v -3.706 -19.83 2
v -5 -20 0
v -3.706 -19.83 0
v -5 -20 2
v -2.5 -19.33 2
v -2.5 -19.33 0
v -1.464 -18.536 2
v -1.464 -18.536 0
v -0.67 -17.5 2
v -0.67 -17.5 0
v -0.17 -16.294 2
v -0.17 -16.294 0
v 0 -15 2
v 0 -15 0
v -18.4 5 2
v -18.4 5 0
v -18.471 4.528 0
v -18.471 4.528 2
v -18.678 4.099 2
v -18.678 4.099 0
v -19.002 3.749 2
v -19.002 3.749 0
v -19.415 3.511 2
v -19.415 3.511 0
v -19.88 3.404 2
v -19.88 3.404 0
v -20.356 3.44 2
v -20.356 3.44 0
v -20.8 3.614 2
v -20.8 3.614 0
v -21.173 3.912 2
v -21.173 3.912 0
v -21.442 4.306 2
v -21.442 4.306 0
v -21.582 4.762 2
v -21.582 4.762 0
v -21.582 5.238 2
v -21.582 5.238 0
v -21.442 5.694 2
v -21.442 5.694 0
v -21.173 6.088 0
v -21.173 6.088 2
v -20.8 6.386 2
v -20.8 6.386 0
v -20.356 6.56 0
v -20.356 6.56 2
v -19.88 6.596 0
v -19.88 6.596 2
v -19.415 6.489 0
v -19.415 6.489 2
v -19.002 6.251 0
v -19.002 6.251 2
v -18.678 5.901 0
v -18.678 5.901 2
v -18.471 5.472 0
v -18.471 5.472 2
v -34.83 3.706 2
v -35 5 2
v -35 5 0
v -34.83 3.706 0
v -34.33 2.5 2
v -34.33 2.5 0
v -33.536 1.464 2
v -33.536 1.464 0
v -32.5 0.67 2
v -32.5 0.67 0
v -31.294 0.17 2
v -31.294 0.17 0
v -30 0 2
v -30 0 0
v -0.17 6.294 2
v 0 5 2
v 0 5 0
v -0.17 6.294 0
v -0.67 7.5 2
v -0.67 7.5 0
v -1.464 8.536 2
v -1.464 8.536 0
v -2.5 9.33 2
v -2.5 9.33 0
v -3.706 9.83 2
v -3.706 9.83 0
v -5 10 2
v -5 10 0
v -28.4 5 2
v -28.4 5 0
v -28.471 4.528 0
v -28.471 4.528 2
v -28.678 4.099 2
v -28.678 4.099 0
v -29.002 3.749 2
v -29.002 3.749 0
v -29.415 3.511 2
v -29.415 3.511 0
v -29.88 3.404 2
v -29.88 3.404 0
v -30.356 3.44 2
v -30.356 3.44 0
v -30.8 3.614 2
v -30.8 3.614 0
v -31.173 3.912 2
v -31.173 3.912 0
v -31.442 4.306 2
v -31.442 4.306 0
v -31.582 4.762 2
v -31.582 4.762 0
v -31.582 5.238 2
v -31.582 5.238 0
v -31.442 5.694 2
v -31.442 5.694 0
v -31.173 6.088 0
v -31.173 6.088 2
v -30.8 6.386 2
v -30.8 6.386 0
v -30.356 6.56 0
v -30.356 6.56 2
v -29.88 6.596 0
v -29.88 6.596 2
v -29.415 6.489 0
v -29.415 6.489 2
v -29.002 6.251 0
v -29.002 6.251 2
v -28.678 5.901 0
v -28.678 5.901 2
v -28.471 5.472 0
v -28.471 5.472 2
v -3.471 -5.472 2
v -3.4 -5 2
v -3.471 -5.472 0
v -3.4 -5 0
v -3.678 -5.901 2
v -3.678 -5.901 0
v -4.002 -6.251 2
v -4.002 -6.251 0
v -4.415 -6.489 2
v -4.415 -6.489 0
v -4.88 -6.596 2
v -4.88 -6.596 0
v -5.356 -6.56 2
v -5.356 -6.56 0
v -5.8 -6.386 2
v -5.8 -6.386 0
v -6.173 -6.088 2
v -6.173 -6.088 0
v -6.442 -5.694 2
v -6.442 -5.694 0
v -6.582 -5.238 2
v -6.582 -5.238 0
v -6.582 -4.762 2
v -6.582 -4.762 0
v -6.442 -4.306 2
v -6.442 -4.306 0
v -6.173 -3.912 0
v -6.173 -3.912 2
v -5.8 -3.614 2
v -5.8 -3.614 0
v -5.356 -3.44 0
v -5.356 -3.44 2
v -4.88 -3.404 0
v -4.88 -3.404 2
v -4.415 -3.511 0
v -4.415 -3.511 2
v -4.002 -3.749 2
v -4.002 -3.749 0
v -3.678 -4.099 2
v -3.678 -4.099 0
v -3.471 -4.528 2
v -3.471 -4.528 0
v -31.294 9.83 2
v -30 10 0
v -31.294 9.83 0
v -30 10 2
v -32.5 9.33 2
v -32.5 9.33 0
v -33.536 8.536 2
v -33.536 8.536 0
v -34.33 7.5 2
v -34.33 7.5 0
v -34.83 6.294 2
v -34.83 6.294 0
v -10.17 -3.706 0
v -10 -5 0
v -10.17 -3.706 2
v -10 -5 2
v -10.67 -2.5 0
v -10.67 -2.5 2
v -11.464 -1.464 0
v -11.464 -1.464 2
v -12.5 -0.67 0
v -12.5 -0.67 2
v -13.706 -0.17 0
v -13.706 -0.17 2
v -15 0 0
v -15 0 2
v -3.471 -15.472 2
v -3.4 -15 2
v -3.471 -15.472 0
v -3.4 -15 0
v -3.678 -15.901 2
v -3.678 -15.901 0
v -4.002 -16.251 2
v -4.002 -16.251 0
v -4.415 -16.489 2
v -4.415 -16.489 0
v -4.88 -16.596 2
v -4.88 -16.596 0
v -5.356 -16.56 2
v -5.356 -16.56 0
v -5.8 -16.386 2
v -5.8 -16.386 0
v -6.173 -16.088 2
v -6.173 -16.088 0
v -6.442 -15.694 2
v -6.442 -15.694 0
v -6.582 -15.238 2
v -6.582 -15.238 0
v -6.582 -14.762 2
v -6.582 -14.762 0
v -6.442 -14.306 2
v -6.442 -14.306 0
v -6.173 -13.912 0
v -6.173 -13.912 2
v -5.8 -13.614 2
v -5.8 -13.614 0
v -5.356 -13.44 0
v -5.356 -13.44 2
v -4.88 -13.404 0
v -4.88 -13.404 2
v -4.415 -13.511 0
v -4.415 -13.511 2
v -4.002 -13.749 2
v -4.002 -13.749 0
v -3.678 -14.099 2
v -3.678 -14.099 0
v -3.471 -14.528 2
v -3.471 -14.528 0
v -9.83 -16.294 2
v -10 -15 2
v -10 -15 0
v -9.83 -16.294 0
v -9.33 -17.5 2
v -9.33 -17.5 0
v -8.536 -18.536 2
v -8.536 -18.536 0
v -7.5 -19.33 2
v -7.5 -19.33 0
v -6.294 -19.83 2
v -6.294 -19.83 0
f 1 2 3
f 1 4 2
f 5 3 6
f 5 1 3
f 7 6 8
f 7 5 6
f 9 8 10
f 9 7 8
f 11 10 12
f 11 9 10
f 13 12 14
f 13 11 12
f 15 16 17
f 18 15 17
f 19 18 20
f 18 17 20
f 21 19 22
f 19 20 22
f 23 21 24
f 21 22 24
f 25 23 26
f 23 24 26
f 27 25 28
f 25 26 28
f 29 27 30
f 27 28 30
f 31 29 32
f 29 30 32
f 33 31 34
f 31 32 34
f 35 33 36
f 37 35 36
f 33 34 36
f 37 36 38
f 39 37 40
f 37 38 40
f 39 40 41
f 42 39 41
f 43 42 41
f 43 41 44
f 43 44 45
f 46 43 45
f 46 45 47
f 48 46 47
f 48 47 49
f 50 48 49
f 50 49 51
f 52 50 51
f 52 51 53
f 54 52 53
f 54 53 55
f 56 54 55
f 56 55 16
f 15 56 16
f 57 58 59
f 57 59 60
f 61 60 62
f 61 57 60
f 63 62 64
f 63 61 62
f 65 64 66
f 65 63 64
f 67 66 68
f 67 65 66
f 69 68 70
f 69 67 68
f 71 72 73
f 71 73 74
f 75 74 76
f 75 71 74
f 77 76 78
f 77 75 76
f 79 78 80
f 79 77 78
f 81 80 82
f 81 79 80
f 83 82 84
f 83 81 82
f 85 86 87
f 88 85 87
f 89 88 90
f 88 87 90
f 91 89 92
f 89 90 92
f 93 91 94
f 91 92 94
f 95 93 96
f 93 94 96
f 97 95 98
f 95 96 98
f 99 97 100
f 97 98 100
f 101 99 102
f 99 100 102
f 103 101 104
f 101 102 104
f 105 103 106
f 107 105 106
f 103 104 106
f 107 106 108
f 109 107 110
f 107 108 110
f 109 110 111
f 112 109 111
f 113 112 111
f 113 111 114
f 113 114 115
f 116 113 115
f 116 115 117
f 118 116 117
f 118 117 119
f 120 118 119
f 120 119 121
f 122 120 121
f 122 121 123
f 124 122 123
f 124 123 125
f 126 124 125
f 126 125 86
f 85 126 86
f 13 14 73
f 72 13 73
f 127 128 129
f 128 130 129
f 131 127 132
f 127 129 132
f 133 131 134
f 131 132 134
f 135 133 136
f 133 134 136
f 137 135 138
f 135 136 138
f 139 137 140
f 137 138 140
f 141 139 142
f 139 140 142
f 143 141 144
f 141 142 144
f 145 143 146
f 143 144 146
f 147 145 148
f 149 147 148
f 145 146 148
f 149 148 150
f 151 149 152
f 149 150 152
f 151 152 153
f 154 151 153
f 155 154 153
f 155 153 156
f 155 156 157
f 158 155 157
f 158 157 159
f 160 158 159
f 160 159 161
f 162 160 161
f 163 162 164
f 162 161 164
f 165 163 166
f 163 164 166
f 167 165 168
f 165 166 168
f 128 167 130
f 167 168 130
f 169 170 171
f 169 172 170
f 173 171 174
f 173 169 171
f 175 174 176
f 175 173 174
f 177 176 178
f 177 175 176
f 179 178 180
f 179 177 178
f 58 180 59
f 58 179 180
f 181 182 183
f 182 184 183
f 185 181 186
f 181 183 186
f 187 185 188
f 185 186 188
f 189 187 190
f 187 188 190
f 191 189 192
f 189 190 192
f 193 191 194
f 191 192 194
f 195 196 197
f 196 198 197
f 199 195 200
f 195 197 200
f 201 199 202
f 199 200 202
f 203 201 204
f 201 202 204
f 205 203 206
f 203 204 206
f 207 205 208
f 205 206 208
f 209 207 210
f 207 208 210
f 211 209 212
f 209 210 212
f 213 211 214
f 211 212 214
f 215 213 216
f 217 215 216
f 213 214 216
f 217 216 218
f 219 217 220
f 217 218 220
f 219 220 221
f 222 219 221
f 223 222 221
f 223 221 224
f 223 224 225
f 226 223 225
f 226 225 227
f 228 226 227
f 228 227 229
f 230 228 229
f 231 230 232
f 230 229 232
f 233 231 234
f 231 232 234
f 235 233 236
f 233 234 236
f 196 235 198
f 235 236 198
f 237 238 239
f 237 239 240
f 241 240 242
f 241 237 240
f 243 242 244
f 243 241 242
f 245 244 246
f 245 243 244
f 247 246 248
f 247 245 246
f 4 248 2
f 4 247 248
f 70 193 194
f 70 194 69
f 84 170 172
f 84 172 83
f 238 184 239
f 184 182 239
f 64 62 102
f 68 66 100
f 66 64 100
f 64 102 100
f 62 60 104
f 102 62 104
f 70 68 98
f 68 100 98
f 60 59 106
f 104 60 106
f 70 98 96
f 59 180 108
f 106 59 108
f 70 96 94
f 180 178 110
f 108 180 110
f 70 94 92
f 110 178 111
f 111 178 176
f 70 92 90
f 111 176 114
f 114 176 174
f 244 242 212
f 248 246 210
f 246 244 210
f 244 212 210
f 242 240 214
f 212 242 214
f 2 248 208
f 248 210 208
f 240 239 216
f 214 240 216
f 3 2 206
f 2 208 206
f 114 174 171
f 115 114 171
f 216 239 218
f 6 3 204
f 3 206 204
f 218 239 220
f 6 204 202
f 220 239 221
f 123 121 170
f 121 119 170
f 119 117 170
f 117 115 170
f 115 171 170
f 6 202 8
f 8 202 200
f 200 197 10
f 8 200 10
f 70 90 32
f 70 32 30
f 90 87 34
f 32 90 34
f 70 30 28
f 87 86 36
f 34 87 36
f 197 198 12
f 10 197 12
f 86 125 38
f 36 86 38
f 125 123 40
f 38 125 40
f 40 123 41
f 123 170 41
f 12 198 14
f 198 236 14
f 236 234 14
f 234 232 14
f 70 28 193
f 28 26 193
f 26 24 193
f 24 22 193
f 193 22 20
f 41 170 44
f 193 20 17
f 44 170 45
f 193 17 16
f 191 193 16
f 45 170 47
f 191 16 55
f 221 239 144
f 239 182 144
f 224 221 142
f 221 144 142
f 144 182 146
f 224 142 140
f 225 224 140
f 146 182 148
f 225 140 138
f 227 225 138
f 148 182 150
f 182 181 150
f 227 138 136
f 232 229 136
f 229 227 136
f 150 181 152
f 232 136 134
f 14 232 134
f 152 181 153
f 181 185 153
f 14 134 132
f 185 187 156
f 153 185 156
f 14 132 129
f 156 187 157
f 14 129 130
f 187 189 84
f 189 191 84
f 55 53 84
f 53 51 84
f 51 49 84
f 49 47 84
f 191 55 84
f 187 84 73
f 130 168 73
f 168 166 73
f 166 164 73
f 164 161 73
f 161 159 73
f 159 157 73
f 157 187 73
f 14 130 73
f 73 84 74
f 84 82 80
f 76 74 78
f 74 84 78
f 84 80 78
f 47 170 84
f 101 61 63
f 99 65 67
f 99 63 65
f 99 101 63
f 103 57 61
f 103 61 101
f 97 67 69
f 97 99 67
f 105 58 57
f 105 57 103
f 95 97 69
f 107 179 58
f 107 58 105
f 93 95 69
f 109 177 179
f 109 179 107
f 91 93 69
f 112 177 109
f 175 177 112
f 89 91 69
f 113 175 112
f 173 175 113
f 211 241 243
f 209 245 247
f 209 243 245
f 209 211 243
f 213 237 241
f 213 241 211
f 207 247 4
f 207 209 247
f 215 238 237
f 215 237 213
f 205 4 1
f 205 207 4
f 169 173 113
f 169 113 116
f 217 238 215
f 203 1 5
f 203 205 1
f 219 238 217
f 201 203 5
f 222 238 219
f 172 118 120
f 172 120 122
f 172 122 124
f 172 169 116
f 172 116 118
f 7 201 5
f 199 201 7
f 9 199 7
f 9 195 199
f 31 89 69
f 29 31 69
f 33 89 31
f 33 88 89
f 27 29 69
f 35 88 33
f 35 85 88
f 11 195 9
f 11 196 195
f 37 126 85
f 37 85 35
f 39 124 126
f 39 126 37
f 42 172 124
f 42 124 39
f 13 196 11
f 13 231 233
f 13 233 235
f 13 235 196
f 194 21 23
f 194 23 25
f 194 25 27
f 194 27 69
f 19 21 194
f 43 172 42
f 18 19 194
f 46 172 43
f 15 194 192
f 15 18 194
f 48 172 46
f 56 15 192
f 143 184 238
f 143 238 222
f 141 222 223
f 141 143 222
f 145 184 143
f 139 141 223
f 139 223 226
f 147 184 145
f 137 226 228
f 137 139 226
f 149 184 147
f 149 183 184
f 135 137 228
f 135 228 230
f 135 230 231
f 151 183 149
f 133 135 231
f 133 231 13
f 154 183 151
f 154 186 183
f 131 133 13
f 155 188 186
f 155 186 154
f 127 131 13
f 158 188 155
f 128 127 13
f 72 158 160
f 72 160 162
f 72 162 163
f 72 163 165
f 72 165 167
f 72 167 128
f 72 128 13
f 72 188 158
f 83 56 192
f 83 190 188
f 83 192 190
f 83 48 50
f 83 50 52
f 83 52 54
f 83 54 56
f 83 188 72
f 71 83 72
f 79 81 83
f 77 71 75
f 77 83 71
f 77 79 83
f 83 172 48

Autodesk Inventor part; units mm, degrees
ref_plane "YZ Plane" through (0, 0, 0) normal (1, 0, 0) x (0, 1, 0)
ref_plane "XZ Plane" through (0, 0, 0) normal (0, 1, 0) x (-1, 0, 0)
ref_plane "XY Plane" through (0, 0, 0) normal (0, 0, 1) x (1, 0, 0)
sketch "スケッチ1" plane through (0, 0, 0) normal (0, 0, 1) x (1, 0, 0)
  line L0 (0, 0) -> (-10, 0)
  line L1 (-10, 0) -> (-10, -20)
  line L2 (-10, -20) -> (0, -20)
  line L3 (0, -20) -> (0, 0)
  line L4 (0, 0) -> (-35, 0)
  line L5 (-35, 0) -> (-35, 10)
  line L6 (-35, 10) -> (0, 10)
  line L7 (0, 10) -> (0, 0)
  line L8 (-5, -20) -> (-5, 0)
  line L9 (0, 5) -> (-35, 5)
  circle A0 centre (-10, 5) radius 1.6
  circle A1 centre (-5, -5) radius 1.6
  circle A2 centre (-20, 5) radius 1.6
  circle A3 centre (-30, 5) radius 1.6
  circle A4 centre (-5, -15) radius 1.6
  circle A5 centre (-5, -25) radius 1.6
  dimension "d0" = 10
  dimension "d1" = 20
  dimension "d2" = 35
  dimension "d3" = 10
  dimension "d4" = 3.2
  dimension "d5" = 3.2
  dimension "d6" = 10
  dimension "d7" = 5
  dimension "d11" = 10
  dimension "d18" = 10
extrude "押し出し1" add sketch "スケッチ1" along normal blind 2 contours L3 L2 L8 A4 A1 L0 | L0 L4 L5 L9 A3 A2 A0 L7 | L8 A1 A4 L2 L1 L0 | L9 A0 A2 A3 L5 L6 L7 | A0 L9 | L9 A0
fillet "フィレット1" radius 5 6 edges at (0, 10, 1) (-35, 10, 1) (-35, 0, 1) (0, -20, 1) (-10, -20, 1) (-10, 0, 1)
properties part number "kakutome_nc"
